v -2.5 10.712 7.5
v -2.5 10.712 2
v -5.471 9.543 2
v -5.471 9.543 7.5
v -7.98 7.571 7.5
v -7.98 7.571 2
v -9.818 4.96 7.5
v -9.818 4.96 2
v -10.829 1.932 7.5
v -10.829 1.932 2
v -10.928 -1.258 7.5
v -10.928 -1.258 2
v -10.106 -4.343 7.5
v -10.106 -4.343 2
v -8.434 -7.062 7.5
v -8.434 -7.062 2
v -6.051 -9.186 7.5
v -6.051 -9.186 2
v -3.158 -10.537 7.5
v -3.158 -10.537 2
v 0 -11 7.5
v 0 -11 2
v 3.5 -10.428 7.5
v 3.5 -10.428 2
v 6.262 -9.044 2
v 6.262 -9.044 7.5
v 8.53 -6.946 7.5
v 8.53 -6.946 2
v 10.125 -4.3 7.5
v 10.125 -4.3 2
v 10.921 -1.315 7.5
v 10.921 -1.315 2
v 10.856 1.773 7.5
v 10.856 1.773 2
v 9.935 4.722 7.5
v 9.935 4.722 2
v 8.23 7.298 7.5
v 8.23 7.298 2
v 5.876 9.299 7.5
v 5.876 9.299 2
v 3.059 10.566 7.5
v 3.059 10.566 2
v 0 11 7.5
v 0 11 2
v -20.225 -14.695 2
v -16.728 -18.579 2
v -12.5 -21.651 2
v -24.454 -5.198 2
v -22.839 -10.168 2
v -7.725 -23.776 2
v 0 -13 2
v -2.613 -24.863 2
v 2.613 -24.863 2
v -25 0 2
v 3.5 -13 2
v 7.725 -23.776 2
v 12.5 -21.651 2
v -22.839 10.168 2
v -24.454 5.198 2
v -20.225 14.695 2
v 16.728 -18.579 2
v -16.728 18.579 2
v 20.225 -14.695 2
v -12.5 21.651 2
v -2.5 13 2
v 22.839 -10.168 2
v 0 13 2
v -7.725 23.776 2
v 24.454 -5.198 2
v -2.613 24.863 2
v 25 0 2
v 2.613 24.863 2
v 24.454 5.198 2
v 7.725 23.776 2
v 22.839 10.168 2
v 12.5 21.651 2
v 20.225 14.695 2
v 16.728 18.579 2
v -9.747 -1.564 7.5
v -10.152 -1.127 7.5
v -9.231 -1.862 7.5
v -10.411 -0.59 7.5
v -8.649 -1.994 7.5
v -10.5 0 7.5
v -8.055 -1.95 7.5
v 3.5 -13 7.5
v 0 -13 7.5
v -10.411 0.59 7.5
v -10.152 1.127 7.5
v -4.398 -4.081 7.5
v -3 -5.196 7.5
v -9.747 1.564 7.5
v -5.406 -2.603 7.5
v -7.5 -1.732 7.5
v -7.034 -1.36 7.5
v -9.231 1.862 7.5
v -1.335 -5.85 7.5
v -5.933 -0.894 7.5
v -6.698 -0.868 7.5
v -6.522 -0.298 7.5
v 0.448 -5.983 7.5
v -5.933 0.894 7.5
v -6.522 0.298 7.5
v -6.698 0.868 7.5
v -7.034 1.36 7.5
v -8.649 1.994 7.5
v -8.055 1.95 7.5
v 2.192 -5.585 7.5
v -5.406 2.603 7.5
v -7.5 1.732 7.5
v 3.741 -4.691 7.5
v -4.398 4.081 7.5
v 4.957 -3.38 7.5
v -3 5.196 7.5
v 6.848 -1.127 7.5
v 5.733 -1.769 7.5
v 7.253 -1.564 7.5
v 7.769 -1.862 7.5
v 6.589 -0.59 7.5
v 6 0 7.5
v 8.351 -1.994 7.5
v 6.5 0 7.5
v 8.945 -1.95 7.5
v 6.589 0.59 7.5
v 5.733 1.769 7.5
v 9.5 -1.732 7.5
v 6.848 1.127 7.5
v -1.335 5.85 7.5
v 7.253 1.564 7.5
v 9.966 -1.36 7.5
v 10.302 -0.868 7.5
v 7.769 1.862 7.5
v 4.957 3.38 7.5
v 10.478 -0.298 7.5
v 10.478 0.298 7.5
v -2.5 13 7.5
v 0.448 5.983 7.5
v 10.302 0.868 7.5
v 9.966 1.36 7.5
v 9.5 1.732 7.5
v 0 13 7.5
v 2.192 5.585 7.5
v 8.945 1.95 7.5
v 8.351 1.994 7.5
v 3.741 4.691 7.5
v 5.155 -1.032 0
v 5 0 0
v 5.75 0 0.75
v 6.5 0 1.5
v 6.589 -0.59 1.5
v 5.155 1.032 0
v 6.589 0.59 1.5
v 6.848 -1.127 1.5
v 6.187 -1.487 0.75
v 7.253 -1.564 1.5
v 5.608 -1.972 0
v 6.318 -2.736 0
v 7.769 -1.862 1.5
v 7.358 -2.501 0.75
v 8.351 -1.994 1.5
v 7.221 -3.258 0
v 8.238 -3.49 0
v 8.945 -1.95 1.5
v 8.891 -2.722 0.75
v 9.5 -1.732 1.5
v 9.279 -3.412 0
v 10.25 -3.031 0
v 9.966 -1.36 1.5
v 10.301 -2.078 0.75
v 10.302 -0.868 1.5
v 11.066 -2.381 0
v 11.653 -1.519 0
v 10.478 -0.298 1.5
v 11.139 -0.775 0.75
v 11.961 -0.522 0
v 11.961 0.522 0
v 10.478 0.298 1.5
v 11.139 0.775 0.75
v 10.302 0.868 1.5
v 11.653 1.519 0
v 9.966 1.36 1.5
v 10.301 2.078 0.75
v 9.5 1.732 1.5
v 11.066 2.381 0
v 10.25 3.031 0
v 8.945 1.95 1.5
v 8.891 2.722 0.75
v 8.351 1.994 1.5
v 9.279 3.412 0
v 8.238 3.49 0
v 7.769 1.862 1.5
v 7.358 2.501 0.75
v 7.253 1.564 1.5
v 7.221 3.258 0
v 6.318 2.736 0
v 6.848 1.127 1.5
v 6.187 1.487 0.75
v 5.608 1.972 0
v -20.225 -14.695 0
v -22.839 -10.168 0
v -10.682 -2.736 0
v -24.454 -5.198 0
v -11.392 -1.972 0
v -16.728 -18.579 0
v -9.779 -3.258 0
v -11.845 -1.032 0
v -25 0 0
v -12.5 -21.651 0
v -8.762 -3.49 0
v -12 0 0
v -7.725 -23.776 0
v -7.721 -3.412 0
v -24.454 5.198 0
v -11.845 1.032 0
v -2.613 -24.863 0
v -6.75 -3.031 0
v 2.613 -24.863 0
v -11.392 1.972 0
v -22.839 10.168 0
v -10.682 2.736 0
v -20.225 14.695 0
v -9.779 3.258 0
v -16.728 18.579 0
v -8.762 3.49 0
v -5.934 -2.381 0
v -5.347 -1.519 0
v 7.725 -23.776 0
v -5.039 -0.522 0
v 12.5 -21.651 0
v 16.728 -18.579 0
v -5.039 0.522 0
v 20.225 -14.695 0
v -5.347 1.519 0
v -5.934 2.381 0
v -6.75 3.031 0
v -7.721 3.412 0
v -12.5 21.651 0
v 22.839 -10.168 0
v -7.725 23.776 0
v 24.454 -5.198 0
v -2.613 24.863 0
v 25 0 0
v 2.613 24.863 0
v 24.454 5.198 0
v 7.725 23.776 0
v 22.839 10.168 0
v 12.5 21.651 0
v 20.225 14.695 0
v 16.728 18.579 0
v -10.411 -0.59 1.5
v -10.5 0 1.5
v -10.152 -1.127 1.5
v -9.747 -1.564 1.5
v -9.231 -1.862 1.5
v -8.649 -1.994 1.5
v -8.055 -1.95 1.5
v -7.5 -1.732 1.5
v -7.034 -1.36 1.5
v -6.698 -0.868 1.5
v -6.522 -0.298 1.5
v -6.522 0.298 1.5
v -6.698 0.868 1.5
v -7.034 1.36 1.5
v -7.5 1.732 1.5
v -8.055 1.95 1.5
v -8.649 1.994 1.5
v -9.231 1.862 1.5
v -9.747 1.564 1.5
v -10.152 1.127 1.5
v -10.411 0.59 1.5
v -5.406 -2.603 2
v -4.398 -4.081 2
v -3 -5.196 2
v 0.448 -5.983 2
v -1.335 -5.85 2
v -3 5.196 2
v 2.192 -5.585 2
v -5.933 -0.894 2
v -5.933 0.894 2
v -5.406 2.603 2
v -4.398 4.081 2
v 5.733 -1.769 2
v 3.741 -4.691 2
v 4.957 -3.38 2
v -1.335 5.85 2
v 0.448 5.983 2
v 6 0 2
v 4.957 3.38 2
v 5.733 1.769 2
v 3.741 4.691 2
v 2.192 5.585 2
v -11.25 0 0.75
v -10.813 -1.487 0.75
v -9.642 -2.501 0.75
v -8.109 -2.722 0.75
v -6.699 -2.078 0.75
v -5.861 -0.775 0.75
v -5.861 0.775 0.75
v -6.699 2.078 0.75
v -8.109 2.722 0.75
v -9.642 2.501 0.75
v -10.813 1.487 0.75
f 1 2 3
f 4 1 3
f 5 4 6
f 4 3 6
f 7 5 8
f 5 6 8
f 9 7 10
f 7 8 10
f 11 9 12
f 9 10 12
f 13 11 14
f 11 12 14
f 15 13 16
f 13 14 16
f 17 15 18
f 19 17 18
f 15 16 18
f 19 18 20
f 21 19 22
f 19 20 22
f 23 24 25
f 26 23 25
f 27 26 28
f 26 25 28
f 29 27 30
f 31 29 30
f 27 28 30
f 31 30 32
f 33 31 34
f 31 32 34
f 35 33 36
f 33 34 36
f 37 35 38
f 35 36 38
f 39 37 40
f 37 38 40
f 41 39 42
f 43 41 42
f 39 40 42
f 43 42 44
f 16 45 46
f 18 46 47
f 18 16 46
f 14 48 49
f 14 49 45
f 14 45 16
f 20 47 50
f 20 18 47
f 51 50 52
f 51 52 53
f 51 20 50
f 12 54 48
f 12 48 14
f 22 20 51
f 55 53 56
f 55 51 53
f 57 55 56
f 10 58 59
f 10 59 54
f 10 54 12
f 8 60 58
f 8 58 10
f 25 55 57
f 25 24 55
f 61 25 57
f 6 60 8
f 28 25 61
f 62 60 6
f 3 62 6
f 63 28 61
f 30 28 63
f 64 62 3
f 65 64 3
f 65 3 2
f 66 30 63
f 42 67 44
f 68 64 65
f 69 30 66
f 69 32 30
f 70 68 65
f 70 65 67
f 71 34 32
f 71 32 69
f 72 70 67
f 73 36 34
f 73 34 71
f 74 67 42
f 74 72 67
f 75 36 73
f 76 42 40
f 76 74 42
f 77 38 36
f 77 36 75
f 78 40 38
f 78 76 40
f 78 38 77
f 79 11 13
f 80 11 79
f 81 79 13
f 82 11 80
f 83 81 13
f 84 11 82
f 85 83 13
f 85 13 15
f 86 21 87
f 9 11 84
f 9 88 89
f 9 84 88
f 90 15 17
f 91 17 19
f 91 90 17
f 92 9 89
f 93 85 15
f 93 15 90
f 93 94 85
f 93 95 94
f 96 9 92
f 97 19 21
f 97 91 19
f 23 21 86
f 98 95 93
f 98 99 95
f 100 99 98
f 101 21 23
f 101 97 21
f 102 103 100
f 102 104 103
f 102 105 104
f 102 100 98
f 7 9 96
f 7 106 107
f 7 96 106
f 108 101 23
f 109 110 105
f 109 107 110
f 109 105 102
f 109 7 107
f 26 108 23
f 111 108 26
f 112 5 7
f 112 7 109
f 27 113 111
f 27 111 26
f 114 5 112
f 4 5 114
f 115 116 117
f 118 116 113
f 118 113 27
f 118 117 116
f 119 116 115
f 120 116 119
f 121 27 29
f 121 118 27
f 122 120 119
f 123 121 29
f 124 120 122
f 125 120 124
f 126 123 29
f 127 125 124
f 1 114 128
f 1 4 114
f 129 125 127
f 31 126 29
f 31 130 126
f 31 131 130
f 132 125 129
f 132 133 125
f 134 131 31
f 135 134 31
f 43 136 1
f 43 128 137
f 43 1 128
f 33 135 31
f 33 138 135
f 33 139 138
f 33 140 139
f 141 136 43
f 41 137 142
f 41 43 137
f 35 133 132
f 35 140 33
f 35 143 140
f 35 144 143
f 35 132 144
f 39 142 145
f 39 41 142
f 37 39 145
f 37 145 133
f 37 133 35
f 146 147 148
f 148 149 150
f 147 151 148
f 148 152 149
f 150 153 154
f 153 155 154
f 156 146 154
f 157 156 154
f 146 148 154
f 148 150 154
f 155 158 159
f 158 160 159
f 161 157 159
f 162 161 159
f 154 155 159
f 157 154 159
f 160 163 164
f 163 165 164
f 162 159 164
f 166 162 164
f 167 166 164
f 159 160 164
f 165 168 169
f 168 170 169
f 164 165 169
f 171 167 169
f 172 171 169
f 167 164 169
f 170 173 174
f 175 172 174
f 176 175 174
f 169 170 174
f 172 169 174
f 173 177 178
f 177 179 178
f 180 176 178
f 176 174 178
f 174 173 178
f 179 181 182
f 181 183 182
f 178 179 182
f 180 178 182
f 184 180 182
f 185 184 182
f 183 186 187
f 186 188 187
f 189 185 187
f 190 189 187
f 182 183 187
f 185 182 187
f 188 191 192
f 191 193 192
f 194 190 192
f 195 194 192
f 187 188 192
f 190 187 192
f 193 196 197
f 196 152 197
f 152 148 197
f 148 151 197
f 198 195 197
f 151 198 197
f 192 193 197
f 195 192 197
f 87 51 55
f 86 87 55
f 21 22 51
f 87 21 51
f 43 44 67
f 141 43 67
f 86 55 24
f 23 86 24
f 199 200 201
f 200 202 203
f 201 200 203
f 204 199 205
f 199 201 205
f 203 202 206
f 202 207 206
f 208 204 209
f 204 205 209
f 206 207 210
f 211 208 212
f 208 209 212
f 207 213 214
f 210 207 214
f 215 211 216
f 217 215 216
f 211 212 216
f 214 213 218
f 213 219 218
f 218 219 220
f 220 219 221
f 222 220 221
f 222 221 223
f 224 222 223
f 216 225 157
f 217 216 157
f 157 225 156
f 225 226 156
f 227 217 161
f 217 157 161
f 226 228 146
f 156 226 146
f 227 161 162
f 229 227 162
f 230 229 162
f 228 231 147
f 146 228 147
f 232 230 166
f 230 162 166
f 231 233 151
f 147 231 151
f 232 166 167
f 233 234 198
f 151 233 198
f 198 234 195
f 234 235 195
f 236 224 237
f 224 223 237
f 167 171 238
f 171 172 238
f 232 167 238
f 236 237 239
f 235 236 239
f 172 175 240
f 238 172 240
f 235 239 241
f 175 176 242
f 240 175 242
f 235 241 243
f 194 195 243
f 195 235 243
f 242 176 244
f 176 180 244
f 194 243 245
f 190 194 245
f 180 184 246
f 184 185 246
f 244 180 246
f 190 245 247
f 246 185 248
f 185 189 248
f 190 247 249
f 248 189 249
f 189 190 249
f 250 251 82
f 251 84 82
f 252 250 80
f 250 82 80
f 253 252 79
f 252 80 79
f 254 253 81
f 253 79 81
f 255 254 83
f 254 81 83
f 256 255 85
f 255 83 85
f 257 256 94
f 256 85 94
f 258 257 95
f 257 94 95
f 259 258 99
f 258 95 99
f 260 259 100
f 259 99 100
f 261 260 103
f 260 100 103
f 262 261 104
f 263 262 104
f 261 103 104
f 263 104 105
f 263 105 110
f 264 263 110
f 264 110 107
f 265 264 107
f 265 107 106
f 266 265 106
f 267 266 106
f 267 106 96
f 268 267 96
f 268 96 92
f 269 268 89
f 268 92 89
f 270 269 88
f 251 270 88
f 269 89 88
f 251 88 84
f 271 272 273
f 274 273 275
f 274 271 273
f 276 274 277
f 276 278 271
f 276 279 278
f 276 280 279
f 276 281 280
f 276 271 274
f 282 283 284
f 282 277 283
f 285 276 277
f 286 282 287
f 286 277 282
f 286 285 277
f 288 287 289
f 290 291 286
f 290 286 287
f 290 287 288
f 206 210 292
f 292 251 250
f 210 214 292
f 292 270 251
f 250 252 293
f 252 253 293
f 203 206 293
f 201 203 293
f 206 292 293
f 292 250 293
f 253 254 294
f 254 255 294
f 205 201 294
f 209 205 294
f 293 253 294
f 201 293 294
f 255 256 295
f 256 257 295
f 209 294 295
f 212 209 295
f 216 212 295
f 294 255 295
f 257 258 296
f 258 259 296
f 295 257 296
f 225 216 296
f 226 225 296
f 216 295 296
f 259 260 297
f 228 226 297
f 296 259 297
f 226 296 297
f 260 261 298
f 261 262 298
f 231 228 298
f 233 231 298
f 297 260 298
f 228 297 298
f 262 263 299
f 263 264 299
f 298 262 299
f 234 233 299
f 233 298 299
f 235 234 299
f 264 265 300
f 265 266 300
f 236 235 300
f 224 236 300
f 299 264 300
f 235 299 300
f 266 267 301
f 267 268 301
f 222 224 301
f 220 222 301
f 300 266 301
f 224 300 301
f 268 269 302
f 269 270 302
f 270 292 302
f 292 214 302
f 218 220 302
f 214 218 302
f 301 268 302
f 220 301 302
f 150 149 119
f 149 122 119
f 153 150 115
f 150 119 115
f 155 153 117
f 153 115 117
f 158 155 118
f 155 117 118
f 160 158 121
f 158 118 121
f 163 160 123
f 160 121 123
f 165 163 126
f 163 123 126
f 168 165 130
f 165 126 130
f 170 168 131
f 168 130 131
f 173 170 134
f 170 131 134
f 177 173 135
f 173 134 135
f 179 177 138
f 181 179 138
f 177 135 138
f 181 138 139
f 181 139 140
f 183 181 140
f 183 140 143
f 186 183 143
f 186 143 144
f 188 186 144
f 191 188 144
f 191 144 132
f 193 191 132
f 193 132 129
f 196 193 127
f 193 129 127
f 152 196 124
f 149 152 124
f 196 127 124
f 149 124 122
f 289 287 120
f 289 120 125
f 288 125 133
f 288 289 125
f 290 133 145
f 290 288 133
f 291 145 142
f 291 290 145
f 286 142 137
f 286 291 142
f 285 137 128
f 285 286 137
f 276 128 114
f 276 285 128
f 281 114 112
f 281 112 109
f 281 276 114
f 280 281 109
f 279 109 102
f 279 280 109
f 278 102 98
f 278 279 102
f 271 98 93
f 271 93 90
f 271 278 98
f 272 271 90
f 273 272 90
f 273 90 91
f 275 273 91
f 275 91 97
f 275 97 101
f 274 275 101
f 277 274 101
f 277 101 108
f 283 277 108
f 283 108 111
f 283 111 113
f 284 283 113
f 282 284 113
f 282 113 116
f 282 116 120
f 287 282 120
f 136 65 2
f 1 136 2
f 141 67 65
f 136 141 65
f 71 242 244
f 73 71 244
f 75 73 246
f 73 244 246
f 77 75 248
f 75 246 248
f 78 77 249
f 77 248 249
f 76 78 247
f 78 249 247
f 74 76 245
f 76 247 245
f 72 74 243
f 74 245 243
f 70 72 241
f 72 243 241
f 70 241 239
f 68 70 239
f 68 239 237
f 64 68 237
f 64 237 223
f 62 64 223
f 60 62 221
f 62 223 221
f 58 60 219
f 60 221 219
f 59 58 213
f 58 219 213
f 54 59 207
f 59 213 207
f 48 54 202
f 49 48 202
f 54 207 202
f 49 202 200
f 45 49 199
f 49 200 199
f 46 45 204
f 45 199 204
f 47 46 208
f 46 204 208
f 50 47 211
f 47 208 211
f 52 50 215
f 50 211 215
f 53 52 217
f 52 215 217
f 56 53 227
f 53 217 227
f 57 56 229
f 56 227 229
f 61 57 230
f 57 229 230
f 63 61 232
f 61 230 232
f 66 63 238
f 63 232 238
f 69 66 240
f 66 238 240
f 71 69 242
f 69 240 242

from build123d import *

# Parameters (mm, degrees)
F0_R           = 25
F0_R_2         = 6
F1_DEPTH       = 2
F2_DEPTH       = 7.5
F5_D           = 4
F5_CSINK_D     = 7
F5_CSINK_ANGLE = 90


# Not quite as in the source:
# - a feature names something its author has since deleted; it is built from what else it names


with BuildPart() as f1:
    # F0 (on Top) → F1 (new body)
    with BuildSketch(Plane.XY):
        Circle(F0_R)
        with BuildLine():
            ThreePointArc((0, 11), (7.7781745931, 7.7781745931), (11, 0))
            ThreePointArc((11, 0), (8.9302855497, -6.4226162893), (3.5, -10.4283268073))
            Line((3.5, -10.4283268073), (3.5, -13))
            Line((3.5, -13), (0, -13))
            Line((0, -13), (0, -11))
            ThreePointArc((0, -11), (-10.9277987049, -1.258258902), (-2.5, 10.7121426428))
            Line((-2.5, 10.7121426428), (-2.5, 13))
            Line((-2.5, 13), (0, 13))
            Line((0, 13), (0, 11))
        make_face(mode=Mode.SUBTRACT)
        with BuildLine():
            ThreePointArc((3.5, -10.4283268073), (8.9302855497, -6.4226162893), (11, 0))
            ThreePointArc((11, 0), (7.7781745931, 7.7781745931), (0, 11))
            ThreePointArc((0, 11), (-1.258258902, 10.9277987049), (-2.5, 10.7121426428))
            ThreePointArc((-2.5, 10.7121426428), (-10.9277987049, -1.258258902), (0, -11))
            ThreePointArc((0, -11), (1.773189939, -10.8561410013), (3.5, -10.4283268073))
        make_face()
        Circle(F0_R_2, mode=Mode.SUBTRACT)
        Circle(F0_R_2)
        with BuildLine():
            ThreePointArc((-2.5, 10.7121426428), (-1.258258902, 10.9277987049), (0, 11))
            Line((0, 11), (0, 13))
            Line((0, 13), (-2.5, 13))
            Line((-2.5, 13), (-2.5, 10.7121426428))
        make_face()
        with BuildLine():
            Line((3.5, -13), (3.5, -10.4283268073))
            ThreePointArc((3.5, -10.4283268073), (1.773189939, -10.8561410013), (0, -11))
            Line((0, -11), (0, -13))
            Line((0, -13), (3.5, -13))
        make_face()
    extrude(amount=F1_DEPTH)

    # F0 (on Top) → F2 (join)
    with BuildSketch(Plane.XY):
        with BuildLine():
            ThreePointArc((3.5, -10.4283268073), (8.9302855497, -6.4226162893), (11, 0))
            ThreePointArc((11, 0), (7.7781745931, 7.7781745931), (0, 11))
            ThreePointArc((0, 11), (-1.258258902, 10.9277987049), (-2.5, 10.7121426428))
            ThreePointArc((-2.5, 10.7121426428), (-10.9277987049, -1.258258902), (0, -11))
            ThreePointArc((0, -11), (1.773189939, -10.8561410013), (3.5, -10.4283268073))
        make_face()
        Circle(F0_R_2, mode=Mode.SUBTRACT)
        with BuildLine():
            Line((3.5, -13), (3.5, -10.4283268073))
            ThreePointArc((3.5, -10.4283268073), (1.773189939, -10.8561410013), (0, -11))
            Line((0, -11), (0, -13))
            Line((0, -13), (3.5, -13))
        make_face()
        with BuildLine():
            ThreePointArc((-2.5, 10.7121426428), (-1.258258902, 10.9277987049), (0, 11))
            Line((0, 11), (0, 13))
            Line((0, 13), (-2.5, 13))
            Line((-2.5, 13), (-2.5, 10.7121426428))
        make_face()
    extrude(amount=F2_DEPTH)

    # F5 (through all)
    with Locations(Plane(origin=(0, 0, 0), x_dir=(1, 0, 0), z_dir=(0, 0, -1))):
        with Locations((-8.5, 0), (8.5, 0)):
            CounterSinkHole(F5_D / 2, F5_CSINK_D / 2, counter_sink_angle=F5_CSINK_ANGLE)


solid = f1.part
